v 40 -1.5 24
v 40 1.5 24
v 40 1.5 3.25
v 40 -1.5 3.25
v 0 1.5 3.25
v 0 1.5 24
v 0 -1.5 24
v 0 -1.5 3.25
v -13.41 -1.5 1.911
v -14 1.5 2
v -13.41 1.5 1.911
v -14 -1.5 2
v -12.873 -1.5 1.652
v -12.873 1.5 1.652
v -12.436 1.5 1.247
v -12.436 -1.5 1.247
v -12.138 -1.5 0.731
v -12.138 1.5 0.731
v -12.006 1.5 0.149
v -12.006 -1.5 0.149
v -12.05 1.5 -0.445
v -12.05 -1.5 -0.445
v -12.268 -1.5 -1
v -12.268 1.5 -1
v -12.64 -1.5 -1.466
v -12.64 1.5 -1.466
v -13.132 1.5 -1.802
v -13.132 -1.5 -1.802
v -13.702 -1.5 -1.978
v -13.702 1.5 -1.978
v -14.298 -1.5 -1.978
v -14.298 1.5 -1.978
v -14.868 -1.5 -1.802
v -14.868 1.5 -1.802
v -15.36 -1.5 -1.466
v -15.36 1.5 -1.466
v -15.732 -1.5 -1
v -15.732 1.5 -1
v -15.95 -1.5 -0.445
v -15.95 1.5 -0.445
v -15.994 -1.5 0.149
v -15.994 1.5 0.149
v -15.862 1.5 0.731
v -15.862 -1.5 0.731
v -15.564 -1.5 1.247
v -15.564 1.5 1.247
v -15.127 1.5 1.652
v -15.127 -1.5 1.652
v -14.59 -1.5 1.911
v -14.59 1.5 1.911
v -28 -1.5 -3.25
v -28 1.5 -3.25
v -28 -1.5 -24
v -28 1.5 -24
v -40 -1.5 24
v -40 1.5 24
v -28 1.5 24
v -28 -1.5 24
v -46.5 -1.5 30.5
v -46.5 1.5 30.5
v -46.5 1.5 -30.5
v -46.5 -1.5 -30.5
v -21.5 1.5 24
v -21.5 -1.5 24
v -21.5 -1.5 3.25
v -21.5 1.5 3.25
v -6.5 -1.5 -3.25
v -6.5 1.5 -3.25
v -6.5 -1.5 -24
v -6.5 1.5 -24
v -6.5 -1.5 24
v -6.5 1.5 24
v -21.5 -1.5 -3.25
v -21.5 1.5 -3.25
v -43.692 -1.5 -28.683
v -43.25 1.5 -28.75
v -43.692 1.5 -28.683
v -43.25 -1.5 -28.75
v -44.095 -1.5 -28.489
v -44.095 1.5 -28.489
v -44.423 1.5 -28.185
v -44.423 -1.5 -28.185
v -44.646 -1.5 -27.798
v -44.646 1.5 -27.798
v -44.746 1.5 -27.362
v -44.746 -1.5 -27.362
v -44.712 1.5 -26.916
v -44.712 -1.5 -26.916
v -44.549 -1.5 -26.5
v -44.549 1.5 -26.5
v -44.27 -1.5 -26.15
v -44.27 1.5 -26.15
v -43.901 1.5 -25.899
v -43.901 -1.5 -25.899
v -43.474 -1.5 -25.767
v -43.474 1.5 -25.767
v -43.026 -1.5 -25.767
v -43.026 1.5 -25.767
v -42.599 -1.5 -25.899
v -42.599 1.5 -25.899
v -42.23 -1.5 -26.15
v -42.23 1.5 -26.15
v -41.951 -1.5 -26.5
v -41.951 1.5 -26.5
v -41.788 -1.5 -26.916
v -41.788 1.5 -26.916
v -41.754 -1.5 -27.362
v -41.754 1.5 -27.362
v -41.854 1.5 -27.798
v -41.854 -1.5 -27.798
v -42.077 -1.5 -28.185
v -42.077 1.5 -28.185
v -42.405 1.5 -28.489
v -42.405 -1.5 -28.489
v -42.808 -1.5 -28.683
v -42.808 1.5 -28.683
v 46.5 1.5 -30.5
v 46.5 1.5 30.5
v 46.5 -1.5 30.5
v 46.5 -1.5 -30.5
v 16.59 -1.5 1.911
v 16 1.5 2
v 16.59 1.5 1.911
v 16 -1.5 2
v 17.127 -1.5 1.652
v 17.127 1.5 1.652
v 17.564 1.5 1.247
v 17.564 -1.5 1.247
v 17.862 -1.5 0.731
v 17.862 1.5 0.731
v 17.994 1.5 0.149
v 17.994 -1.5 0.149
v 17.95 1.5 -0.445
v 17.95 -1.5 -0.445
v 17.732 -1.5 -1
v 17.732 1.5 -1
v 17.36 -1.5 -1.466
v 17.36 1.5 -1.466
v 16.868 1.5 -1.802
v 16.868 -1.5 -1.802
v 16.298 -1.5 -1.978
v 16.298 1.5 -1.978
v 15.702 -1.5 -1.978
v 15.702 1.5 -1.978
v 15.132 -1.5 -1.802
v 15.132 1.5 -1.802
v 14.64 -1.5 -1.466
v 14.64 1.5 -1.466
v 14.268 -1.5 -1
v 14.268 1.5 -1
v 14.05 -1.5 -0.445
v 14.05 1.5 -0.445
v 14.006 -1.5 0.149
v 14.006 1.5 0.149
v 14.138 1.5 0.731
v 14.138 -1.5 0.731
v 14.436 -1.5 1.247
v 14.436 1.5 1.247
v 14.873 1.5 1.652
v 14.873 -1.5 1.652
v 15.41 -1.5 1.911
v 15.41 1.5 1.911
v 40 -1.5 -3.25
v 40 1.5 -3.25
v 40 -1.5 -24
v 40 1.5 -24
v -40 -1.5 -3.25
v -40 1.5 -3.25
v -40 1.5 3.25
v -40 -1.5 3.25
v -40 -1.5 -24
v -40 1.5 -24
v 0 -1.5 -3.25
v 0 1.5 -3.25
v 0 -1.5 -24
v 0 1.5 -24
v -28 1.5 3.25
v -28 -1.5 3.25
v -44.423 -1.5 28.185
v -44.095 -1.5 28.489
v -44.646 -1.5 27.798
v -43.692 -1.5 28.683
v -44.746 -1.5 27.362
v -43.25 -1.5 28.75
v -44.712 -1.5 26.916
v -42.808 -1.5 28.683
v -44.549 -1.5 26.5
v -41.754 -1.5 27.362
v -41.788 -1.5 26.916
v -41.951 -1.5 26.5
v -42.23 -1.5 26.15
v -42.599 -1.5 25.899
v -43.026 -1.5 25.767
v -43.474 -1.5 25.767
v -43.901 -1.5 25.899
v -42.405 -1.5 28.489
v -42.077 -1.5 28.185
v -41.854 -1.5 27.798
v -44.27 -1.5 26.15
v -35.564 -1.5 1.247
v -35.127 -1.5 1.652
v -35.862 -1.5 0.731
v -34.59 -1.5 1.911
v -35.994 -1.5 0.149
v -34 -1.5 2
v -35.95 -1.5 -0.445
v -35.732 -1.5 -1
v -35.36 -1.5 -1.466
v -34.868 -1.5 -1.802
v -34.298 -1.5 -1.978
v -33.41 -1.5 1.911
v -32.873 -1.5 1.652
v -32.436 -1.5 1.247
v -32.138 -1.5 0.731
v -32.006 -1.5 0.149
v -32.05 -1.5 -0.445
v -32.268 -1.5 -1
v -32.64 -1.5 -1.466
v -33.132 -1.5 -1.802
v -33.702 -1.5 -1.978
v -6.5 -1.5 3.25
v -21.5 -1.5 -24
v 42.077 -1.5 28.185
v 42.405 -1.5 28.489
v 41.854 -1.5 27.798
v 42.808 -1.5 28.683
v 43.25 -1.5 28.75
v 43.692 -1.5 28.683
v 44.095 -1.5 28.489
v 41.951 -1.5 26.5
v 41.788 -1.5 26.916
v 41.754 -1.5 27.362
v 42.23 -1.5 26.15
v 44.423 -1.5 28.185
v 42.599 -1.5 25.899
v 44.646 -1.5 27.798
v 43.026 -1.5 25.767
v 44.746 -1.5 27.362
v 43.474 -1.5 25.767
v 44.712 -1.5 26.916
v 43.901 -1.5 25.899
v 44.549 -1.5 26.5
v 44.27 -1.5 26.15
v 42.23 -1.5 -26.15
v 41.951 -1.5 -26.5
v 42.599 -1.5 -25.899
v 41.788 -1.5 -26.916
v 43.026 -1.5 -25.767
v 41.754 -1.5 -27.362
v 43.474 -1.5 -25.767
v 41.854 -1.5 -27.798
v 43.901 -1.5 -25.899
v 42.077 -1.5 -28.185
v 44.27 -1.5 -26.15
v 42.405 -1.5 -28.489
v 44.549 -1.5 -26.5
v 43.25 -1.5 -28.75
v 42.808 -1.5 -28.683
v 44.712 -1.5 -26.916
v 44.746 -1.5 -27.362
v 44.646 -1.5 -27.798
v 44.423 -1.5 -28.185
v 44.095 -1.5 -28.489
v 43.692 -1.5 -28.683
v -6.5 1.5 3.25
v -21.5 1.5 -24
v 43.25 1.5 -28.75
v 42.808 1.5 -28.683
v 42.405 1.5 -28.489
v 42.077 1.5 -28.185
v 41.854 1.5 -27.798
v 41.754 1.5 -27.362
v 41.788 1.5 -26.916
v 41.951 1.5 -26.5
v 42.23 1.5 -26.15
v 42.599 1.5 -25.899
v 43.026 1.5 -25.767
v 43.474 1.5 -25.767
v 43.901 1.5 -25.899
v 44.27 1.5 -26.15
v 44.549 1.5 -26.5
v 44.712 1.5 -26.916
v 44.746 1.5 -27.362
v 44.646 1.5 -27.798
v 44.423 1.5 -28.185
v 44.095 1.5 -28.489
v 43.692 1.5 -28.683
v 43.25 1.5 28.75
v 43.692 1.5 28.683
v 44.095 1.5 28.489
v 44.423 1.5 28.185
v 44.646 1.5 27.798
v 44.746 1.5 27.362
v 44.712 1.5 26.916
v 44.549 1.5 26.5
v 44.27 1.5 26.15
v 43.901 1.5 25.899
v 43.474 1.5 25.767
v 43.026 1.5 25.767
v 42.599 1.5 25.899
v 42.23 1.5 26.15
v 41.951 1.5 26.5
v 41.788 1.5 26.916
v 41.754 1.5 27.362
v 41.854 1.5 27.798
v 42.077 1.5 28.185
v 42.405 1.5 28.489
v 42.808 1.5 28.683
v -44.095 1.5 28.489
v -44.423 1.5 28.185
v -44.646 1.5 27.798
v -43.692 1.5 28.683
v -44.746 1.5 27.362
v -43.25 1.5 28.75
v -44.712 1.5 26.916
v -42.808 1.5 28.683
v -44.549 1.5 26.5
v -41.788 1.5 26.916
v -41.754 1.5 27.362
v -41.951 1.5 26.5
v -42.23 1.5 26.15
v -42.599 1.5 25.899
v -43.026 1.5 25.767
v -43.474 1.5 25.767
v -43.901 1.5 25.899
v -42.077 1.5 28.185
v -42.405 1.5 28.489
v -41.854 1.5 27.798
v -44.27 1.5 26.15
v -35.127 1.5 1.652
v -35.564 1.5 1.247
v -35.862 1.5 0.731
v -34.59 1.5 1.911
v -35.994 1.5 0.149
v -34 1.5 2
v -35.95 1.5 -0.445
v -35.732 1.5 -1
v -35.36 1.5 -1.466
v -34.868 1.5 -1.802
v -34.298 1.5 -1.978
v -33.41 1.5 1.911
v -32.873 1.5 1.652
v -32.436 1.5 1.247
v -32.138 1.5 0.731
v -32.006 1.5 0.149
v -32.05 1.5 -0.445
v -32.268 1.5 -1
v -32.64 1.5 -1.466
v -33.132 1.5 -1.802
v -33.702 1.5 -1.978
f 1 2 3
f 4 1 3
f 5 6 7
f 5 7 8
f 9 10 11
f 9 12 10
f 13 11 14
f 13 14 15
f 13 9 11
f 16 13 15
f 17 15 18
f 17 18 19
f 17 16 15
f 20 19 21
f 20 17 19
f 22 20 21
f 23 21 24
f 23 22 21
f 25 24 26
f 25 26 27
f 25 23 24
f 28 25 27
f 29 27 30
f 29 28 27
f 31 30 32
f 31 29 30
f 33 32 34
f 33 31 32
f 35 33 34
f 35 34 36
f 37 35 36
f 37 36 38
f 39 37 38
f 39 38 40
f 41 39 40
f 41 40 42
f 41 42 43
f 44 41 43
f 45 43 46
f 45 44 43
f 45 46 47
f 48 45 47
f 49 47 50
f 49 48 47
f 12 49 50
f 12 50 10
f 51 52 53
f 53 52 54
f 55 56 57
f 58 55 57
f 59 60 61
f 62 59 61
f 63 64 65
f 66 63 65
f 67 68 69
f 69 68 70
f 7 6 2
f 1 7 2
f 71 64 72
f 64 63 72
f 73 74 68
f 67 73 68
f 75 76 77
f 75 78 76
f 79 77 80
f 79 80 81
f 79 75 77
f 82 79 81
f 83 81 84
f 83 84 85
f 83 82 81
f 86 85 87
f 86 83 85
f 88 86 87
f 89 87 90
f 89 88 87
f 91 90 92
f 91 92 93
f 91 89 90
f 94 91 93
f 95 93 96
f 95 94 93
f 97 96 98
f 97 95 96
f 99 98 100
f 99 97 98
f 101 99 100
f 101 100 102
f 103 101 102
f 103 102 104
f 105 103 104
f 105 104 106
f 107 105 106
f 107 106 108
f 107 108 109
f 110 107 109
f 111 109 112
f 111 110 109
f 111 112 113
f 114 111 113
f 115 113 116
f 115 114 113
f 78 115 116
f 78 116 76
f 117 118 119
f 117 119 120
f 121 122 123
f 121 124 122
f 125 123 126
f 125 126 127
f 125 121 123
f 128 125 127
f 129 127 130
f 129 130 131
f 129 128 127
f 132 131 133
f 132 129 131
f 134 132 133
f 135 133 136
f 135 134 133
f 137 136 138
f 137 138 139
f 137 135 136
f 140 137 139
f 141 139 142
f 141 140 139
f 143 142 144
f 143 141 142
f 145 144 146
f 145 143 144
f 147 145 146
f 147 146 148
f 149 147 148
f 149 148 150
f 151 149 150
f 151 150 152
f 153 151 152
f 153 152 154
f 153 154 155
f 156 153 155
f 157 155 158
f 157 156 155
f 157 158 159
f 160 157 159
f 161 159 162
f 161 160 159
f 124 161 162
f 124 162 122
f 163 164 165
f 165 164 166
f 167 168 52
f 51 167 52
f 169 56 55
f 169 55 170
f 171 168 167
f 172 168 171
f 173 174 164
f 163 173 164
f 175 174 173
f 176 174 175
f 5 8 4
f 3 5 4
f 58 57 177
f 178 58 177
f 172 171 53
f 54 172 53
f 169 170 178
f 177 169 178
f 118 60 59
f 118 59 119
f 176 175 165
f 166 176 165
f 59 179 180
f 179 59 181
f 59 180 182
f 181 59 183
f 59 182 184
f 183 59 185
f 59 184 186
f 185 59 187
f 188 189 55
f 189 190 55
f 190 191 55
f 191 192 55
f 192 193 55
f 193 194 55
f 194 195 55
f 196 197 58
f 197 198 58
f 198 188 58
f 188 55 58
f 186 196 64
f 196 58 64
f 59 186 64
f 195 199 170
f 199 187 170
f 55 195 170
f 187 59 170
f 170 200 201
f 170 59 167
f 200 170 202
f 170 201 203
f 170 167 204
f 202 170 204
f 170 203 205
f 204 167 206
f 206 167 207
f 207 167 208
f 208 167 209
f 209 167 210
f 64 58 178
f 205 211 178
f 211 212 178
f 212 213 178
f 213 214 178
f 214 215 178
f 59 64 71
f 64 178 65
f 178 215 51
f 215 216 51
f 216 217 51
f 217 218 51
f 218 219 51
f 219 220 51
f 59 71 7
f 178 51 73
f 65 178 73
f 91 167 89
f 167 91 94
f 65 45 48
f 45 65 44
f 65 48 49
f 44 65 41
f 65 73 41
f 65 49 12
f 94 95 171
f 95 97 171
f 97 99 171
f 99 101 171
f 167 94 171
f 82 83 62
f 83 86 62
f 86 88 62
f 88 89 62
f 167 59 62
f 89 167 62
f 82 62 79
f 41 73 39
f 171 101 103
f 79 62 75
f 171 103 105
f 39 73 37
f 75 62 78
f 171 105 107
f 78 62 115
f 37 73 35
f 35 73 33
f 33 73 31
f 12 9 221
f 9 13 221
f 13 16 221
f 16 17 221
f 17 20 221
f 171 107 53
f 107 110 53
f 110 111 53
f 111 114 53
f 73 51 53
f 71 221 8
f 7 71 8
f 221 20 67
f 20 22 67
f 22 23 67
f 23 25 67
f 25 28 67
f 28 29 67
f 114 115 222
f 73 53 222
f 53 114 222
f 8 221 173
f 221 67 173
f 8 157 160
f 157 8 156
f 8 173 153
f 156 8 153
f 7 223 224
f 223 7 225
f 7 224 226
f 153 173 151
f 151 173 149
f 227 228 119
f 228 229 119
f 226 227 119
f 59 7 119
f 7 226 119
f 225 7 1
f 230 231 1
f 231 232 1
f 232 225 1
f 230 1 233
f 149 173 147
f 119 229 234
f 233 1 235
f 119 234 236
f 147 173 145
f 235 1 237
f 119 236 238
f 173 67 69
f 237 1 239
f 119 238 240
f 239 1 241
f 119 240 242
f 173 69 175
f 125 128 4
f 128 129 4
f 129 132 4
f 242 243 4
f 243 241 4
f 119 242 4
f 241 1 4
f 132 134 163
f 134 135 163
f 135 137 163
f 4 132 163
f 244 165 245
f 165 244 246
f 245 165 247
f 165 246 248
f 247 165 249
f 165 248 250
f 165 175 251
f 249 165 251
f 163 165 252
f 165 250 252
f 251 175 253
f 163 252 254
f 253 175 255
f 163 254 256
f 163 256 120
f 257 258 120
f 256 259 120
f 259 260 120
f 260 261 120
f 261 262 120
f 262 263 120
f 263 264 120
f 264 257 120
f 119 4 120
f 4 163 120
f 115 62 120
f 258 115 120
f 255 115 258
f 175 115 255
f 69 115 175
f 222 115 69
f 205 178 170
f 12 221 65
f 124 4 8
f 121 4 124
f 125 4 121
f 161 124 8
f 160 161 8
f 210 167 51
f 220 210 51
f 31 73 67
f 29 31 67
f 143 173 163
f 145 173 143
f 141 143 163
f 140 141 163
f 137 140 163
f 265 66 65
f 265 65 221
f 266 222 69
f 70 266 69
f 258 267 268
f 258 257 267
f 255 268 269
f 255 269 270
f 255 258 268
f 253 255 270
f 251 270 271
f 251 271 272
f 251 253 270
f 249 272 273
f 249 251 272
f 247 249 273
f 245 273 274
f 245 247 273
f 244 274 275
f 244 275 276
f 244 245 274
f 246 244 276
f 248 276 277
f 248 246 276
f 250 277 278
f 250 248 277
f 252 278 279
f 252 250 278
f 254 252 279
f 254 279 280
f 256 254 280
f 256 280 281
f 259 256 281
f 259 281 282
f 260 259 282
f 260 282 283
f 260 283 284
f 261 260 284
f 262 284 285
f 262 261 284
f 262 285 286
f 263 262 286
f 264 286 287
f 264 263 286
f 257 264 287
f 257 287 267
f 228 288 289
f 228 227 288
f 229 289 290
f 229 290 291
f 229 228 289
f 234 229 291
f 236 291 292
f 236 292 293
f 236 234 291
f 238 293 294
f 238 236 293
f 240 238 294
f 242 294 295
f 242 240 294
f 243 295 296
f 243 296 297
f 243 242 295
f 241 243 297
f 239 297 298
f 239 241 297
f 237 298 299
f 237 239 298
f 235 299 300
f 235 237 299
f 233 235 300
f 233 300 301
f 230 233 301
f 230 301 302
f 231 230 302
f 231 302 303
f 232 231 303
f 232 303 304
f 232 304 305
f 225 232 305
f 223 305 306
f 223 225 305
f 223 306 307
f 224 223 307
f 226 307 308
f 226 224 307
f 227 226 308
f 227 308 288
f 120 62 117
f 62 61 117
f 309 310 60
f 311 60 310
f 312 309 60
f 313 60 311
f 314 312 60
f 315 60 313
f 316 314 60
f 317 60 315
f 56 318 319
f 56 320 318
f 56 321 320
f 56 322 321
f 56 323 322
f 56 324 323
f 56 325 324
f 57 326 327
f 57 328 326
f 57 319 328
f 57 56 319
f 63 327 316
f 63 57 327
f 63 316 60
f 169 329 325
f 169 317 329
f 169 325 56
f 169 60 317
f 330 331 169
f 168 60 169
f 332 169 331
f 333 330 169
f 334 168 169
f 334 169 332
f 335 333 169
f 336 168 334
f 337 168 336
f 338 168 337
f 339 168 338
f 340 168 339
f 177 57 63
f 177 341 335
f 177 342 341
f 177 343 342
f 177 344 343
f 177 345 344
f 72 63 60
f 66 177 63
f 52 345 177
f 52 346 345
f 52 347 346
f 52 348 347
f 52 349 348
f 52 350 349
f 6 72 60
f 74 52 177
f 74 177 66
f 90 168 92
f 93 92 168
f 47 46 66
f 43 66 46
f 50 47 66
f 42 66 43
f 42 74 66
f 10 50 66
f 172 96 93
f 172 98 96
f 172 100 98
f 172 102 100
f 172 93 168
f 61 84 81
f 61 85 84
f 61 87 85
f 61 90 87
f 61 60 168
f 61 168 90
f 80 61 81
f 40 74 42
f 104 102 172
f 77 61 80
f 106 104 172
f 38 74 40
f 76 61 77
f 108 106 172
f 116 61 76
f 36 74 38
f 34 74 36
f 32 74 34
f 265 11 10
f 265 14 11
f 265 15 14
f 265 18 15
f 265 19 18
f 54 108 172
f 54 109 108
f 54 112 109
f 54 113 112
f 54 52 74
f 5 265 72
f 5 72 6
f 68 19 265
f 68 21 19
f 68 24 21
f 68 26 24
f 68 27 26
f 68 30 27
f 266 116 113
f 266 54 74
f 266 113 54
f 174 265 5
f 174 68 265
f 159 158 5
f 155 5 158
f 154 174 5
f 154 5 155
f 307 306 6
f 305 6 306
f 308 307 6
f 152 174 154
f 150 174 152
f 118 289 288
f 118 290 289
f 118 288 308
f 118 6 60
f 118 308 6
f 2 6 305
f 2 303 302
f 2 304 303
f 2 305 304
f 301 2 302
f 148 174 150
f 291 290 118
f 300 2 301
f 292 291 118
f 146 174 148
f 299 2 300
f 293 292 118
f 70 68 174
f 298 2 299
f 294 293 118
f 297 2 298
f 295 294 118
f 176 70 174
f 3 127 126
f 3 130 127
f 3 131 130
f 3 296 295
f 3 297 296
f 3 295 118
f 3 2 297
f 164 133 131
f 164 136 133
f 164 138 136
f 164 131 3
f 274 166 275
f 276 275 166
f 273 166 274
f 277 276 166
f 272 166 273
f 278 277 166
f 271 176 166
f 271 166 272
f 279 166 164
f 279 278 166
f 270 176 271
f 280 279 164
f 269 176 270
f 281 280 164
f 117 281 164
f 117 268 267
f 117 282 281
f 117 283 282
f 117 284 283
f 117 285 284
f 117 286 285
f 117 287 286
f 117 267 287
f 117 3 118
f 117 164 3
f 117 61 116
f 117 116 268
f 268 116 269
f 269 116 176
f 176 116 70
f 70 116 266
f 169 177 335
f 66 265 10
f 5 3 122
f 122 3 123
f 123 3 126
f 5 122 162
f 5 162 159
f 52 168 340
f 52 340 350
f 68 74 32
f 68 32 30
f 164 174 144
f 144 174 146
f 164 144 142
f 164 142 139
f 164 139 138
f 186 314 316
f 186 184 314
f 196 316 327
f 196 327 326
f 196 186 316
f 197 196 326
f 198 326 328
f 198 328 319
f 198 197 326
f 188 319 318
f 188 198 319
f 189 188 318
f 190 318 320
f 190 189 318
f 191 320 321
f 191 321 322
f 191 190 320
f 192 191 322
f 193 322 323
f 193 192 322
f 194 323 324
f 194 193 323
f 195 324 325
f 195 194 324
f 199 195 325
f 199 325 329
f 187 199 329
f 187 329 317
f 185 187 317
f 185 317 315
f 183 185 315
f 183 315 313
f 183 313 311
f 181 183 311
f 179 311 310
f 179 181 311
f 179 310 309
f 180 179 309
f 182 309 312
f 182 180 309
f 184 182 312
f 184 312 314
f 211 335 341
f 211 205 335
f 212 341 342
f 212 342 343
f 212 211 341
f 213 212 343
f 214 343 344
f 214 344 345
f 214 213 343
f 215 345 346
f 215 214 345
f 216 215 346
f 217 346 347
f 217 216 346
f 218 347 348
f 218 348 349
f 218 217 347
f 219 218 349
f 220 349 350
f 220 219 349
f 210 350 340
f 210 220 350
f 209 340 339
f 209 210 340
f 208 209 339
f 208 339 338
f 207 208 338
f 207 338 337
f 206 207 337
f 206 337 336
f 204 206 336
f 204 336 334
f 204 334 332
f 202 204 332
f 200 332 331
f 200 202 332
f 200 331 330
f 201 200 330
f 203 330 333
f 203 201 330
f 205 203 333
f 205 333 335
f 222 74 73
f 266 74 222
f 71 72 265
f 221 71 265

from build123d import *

# Parameters (mm, degrees)
SKETCH1_W           = 93
SKETCH1_H           = 61
SKETCH1_R           = 2
SKETCH1_R_2         = 1.5
SKETCH1_W_2         = 12
SKETCH1_H_2         = 20.75
SKETCH1_W_3         = 40
SKETCH1_W_4         = 15
BOSS_EXTRUDE1_DEPTH = 1.5


with BuildPart() as part:
    # Sketch1 → Boss-Extrude1 (new, symmetric)
    with BuildSketch(Plane(origin=(0, 0, 0), x_dir=(1, 0, 0), z_dir=(0, 1, 0))):
        Rectangle(SKETCH1_W, SKETCH1_H)
        with Locations(Location((-34, 0, 0), (0, 0, 270))):
            Circle(SKETCH1_R, mode=Mode.SUBTRACT)
        with Locations(Location((-14, 0, 0), (0, 0, 270))):
            Circle(SKETCH1_R, mode=Mode.SUBTRACT)
        with Locations(Location((16, 0, 0), (0, 0, 270))):
            Circle(SKETCH1_R, mode=Mode.SUBTRACT)
        with Locations(Location((43.25, -27.25, 0), (0, 0, 270))):
            Circle(SKETCH1_R_2, mode=Mode.SUBTRACT)
        with Locations(Location((-43.25, -27.25, 0), (0, 0, 270))):
            Circle(SKETCH1_R_2, mode=Mode.SUBTRACT)
        with Locations(Location((43.25, 27.25, 0), (0, 0, 90))):
            Circle(SKETCH1_R_2, mode=Mode.SUBTRACT)
        with Locations(Location((-43.25, 27.25, 0), (0, 0, 90))):
            Circle(SKETCH1_R_2, mode=Mode.SUBTRACT)
        with Locations((-34, -13.625)):
            Rectangle(SKETCH1_W_2, SKETCH1_H_2, mode=Mode.SUBTRACT)
        with Locations((-34, 13.625)):
            Rectangle(SKETCH1_W_2, SKETCH1_H_2, mode=Mode.SUBTRACT)
        with Locations((20, -13.625)):
            Rectangle(SKETCH1_W_3, SKETCH1_H_2, mode=Mode.SUBTRACT)
        with Locations((-14, 13.625)):
            Rectangle(SKETCH1_W_4, SKETCH1_H_2, mode=Mode.SUBTRACT)
        with Locations((20, 13.625)):
            Rectangle(SKETCH1_W_3, SKETCH1_H_2, mode=Mode.SUBTRACT)
        with Locations((-14, -13.625)):
            Rectangle(SKETCH1_W_4, SKETCH1_H_2, mode=Mode.SUBTRACT)
    extrude(amount=BOSS_EXTRUDE1_DEPTH, both=True)


solid = part.part
